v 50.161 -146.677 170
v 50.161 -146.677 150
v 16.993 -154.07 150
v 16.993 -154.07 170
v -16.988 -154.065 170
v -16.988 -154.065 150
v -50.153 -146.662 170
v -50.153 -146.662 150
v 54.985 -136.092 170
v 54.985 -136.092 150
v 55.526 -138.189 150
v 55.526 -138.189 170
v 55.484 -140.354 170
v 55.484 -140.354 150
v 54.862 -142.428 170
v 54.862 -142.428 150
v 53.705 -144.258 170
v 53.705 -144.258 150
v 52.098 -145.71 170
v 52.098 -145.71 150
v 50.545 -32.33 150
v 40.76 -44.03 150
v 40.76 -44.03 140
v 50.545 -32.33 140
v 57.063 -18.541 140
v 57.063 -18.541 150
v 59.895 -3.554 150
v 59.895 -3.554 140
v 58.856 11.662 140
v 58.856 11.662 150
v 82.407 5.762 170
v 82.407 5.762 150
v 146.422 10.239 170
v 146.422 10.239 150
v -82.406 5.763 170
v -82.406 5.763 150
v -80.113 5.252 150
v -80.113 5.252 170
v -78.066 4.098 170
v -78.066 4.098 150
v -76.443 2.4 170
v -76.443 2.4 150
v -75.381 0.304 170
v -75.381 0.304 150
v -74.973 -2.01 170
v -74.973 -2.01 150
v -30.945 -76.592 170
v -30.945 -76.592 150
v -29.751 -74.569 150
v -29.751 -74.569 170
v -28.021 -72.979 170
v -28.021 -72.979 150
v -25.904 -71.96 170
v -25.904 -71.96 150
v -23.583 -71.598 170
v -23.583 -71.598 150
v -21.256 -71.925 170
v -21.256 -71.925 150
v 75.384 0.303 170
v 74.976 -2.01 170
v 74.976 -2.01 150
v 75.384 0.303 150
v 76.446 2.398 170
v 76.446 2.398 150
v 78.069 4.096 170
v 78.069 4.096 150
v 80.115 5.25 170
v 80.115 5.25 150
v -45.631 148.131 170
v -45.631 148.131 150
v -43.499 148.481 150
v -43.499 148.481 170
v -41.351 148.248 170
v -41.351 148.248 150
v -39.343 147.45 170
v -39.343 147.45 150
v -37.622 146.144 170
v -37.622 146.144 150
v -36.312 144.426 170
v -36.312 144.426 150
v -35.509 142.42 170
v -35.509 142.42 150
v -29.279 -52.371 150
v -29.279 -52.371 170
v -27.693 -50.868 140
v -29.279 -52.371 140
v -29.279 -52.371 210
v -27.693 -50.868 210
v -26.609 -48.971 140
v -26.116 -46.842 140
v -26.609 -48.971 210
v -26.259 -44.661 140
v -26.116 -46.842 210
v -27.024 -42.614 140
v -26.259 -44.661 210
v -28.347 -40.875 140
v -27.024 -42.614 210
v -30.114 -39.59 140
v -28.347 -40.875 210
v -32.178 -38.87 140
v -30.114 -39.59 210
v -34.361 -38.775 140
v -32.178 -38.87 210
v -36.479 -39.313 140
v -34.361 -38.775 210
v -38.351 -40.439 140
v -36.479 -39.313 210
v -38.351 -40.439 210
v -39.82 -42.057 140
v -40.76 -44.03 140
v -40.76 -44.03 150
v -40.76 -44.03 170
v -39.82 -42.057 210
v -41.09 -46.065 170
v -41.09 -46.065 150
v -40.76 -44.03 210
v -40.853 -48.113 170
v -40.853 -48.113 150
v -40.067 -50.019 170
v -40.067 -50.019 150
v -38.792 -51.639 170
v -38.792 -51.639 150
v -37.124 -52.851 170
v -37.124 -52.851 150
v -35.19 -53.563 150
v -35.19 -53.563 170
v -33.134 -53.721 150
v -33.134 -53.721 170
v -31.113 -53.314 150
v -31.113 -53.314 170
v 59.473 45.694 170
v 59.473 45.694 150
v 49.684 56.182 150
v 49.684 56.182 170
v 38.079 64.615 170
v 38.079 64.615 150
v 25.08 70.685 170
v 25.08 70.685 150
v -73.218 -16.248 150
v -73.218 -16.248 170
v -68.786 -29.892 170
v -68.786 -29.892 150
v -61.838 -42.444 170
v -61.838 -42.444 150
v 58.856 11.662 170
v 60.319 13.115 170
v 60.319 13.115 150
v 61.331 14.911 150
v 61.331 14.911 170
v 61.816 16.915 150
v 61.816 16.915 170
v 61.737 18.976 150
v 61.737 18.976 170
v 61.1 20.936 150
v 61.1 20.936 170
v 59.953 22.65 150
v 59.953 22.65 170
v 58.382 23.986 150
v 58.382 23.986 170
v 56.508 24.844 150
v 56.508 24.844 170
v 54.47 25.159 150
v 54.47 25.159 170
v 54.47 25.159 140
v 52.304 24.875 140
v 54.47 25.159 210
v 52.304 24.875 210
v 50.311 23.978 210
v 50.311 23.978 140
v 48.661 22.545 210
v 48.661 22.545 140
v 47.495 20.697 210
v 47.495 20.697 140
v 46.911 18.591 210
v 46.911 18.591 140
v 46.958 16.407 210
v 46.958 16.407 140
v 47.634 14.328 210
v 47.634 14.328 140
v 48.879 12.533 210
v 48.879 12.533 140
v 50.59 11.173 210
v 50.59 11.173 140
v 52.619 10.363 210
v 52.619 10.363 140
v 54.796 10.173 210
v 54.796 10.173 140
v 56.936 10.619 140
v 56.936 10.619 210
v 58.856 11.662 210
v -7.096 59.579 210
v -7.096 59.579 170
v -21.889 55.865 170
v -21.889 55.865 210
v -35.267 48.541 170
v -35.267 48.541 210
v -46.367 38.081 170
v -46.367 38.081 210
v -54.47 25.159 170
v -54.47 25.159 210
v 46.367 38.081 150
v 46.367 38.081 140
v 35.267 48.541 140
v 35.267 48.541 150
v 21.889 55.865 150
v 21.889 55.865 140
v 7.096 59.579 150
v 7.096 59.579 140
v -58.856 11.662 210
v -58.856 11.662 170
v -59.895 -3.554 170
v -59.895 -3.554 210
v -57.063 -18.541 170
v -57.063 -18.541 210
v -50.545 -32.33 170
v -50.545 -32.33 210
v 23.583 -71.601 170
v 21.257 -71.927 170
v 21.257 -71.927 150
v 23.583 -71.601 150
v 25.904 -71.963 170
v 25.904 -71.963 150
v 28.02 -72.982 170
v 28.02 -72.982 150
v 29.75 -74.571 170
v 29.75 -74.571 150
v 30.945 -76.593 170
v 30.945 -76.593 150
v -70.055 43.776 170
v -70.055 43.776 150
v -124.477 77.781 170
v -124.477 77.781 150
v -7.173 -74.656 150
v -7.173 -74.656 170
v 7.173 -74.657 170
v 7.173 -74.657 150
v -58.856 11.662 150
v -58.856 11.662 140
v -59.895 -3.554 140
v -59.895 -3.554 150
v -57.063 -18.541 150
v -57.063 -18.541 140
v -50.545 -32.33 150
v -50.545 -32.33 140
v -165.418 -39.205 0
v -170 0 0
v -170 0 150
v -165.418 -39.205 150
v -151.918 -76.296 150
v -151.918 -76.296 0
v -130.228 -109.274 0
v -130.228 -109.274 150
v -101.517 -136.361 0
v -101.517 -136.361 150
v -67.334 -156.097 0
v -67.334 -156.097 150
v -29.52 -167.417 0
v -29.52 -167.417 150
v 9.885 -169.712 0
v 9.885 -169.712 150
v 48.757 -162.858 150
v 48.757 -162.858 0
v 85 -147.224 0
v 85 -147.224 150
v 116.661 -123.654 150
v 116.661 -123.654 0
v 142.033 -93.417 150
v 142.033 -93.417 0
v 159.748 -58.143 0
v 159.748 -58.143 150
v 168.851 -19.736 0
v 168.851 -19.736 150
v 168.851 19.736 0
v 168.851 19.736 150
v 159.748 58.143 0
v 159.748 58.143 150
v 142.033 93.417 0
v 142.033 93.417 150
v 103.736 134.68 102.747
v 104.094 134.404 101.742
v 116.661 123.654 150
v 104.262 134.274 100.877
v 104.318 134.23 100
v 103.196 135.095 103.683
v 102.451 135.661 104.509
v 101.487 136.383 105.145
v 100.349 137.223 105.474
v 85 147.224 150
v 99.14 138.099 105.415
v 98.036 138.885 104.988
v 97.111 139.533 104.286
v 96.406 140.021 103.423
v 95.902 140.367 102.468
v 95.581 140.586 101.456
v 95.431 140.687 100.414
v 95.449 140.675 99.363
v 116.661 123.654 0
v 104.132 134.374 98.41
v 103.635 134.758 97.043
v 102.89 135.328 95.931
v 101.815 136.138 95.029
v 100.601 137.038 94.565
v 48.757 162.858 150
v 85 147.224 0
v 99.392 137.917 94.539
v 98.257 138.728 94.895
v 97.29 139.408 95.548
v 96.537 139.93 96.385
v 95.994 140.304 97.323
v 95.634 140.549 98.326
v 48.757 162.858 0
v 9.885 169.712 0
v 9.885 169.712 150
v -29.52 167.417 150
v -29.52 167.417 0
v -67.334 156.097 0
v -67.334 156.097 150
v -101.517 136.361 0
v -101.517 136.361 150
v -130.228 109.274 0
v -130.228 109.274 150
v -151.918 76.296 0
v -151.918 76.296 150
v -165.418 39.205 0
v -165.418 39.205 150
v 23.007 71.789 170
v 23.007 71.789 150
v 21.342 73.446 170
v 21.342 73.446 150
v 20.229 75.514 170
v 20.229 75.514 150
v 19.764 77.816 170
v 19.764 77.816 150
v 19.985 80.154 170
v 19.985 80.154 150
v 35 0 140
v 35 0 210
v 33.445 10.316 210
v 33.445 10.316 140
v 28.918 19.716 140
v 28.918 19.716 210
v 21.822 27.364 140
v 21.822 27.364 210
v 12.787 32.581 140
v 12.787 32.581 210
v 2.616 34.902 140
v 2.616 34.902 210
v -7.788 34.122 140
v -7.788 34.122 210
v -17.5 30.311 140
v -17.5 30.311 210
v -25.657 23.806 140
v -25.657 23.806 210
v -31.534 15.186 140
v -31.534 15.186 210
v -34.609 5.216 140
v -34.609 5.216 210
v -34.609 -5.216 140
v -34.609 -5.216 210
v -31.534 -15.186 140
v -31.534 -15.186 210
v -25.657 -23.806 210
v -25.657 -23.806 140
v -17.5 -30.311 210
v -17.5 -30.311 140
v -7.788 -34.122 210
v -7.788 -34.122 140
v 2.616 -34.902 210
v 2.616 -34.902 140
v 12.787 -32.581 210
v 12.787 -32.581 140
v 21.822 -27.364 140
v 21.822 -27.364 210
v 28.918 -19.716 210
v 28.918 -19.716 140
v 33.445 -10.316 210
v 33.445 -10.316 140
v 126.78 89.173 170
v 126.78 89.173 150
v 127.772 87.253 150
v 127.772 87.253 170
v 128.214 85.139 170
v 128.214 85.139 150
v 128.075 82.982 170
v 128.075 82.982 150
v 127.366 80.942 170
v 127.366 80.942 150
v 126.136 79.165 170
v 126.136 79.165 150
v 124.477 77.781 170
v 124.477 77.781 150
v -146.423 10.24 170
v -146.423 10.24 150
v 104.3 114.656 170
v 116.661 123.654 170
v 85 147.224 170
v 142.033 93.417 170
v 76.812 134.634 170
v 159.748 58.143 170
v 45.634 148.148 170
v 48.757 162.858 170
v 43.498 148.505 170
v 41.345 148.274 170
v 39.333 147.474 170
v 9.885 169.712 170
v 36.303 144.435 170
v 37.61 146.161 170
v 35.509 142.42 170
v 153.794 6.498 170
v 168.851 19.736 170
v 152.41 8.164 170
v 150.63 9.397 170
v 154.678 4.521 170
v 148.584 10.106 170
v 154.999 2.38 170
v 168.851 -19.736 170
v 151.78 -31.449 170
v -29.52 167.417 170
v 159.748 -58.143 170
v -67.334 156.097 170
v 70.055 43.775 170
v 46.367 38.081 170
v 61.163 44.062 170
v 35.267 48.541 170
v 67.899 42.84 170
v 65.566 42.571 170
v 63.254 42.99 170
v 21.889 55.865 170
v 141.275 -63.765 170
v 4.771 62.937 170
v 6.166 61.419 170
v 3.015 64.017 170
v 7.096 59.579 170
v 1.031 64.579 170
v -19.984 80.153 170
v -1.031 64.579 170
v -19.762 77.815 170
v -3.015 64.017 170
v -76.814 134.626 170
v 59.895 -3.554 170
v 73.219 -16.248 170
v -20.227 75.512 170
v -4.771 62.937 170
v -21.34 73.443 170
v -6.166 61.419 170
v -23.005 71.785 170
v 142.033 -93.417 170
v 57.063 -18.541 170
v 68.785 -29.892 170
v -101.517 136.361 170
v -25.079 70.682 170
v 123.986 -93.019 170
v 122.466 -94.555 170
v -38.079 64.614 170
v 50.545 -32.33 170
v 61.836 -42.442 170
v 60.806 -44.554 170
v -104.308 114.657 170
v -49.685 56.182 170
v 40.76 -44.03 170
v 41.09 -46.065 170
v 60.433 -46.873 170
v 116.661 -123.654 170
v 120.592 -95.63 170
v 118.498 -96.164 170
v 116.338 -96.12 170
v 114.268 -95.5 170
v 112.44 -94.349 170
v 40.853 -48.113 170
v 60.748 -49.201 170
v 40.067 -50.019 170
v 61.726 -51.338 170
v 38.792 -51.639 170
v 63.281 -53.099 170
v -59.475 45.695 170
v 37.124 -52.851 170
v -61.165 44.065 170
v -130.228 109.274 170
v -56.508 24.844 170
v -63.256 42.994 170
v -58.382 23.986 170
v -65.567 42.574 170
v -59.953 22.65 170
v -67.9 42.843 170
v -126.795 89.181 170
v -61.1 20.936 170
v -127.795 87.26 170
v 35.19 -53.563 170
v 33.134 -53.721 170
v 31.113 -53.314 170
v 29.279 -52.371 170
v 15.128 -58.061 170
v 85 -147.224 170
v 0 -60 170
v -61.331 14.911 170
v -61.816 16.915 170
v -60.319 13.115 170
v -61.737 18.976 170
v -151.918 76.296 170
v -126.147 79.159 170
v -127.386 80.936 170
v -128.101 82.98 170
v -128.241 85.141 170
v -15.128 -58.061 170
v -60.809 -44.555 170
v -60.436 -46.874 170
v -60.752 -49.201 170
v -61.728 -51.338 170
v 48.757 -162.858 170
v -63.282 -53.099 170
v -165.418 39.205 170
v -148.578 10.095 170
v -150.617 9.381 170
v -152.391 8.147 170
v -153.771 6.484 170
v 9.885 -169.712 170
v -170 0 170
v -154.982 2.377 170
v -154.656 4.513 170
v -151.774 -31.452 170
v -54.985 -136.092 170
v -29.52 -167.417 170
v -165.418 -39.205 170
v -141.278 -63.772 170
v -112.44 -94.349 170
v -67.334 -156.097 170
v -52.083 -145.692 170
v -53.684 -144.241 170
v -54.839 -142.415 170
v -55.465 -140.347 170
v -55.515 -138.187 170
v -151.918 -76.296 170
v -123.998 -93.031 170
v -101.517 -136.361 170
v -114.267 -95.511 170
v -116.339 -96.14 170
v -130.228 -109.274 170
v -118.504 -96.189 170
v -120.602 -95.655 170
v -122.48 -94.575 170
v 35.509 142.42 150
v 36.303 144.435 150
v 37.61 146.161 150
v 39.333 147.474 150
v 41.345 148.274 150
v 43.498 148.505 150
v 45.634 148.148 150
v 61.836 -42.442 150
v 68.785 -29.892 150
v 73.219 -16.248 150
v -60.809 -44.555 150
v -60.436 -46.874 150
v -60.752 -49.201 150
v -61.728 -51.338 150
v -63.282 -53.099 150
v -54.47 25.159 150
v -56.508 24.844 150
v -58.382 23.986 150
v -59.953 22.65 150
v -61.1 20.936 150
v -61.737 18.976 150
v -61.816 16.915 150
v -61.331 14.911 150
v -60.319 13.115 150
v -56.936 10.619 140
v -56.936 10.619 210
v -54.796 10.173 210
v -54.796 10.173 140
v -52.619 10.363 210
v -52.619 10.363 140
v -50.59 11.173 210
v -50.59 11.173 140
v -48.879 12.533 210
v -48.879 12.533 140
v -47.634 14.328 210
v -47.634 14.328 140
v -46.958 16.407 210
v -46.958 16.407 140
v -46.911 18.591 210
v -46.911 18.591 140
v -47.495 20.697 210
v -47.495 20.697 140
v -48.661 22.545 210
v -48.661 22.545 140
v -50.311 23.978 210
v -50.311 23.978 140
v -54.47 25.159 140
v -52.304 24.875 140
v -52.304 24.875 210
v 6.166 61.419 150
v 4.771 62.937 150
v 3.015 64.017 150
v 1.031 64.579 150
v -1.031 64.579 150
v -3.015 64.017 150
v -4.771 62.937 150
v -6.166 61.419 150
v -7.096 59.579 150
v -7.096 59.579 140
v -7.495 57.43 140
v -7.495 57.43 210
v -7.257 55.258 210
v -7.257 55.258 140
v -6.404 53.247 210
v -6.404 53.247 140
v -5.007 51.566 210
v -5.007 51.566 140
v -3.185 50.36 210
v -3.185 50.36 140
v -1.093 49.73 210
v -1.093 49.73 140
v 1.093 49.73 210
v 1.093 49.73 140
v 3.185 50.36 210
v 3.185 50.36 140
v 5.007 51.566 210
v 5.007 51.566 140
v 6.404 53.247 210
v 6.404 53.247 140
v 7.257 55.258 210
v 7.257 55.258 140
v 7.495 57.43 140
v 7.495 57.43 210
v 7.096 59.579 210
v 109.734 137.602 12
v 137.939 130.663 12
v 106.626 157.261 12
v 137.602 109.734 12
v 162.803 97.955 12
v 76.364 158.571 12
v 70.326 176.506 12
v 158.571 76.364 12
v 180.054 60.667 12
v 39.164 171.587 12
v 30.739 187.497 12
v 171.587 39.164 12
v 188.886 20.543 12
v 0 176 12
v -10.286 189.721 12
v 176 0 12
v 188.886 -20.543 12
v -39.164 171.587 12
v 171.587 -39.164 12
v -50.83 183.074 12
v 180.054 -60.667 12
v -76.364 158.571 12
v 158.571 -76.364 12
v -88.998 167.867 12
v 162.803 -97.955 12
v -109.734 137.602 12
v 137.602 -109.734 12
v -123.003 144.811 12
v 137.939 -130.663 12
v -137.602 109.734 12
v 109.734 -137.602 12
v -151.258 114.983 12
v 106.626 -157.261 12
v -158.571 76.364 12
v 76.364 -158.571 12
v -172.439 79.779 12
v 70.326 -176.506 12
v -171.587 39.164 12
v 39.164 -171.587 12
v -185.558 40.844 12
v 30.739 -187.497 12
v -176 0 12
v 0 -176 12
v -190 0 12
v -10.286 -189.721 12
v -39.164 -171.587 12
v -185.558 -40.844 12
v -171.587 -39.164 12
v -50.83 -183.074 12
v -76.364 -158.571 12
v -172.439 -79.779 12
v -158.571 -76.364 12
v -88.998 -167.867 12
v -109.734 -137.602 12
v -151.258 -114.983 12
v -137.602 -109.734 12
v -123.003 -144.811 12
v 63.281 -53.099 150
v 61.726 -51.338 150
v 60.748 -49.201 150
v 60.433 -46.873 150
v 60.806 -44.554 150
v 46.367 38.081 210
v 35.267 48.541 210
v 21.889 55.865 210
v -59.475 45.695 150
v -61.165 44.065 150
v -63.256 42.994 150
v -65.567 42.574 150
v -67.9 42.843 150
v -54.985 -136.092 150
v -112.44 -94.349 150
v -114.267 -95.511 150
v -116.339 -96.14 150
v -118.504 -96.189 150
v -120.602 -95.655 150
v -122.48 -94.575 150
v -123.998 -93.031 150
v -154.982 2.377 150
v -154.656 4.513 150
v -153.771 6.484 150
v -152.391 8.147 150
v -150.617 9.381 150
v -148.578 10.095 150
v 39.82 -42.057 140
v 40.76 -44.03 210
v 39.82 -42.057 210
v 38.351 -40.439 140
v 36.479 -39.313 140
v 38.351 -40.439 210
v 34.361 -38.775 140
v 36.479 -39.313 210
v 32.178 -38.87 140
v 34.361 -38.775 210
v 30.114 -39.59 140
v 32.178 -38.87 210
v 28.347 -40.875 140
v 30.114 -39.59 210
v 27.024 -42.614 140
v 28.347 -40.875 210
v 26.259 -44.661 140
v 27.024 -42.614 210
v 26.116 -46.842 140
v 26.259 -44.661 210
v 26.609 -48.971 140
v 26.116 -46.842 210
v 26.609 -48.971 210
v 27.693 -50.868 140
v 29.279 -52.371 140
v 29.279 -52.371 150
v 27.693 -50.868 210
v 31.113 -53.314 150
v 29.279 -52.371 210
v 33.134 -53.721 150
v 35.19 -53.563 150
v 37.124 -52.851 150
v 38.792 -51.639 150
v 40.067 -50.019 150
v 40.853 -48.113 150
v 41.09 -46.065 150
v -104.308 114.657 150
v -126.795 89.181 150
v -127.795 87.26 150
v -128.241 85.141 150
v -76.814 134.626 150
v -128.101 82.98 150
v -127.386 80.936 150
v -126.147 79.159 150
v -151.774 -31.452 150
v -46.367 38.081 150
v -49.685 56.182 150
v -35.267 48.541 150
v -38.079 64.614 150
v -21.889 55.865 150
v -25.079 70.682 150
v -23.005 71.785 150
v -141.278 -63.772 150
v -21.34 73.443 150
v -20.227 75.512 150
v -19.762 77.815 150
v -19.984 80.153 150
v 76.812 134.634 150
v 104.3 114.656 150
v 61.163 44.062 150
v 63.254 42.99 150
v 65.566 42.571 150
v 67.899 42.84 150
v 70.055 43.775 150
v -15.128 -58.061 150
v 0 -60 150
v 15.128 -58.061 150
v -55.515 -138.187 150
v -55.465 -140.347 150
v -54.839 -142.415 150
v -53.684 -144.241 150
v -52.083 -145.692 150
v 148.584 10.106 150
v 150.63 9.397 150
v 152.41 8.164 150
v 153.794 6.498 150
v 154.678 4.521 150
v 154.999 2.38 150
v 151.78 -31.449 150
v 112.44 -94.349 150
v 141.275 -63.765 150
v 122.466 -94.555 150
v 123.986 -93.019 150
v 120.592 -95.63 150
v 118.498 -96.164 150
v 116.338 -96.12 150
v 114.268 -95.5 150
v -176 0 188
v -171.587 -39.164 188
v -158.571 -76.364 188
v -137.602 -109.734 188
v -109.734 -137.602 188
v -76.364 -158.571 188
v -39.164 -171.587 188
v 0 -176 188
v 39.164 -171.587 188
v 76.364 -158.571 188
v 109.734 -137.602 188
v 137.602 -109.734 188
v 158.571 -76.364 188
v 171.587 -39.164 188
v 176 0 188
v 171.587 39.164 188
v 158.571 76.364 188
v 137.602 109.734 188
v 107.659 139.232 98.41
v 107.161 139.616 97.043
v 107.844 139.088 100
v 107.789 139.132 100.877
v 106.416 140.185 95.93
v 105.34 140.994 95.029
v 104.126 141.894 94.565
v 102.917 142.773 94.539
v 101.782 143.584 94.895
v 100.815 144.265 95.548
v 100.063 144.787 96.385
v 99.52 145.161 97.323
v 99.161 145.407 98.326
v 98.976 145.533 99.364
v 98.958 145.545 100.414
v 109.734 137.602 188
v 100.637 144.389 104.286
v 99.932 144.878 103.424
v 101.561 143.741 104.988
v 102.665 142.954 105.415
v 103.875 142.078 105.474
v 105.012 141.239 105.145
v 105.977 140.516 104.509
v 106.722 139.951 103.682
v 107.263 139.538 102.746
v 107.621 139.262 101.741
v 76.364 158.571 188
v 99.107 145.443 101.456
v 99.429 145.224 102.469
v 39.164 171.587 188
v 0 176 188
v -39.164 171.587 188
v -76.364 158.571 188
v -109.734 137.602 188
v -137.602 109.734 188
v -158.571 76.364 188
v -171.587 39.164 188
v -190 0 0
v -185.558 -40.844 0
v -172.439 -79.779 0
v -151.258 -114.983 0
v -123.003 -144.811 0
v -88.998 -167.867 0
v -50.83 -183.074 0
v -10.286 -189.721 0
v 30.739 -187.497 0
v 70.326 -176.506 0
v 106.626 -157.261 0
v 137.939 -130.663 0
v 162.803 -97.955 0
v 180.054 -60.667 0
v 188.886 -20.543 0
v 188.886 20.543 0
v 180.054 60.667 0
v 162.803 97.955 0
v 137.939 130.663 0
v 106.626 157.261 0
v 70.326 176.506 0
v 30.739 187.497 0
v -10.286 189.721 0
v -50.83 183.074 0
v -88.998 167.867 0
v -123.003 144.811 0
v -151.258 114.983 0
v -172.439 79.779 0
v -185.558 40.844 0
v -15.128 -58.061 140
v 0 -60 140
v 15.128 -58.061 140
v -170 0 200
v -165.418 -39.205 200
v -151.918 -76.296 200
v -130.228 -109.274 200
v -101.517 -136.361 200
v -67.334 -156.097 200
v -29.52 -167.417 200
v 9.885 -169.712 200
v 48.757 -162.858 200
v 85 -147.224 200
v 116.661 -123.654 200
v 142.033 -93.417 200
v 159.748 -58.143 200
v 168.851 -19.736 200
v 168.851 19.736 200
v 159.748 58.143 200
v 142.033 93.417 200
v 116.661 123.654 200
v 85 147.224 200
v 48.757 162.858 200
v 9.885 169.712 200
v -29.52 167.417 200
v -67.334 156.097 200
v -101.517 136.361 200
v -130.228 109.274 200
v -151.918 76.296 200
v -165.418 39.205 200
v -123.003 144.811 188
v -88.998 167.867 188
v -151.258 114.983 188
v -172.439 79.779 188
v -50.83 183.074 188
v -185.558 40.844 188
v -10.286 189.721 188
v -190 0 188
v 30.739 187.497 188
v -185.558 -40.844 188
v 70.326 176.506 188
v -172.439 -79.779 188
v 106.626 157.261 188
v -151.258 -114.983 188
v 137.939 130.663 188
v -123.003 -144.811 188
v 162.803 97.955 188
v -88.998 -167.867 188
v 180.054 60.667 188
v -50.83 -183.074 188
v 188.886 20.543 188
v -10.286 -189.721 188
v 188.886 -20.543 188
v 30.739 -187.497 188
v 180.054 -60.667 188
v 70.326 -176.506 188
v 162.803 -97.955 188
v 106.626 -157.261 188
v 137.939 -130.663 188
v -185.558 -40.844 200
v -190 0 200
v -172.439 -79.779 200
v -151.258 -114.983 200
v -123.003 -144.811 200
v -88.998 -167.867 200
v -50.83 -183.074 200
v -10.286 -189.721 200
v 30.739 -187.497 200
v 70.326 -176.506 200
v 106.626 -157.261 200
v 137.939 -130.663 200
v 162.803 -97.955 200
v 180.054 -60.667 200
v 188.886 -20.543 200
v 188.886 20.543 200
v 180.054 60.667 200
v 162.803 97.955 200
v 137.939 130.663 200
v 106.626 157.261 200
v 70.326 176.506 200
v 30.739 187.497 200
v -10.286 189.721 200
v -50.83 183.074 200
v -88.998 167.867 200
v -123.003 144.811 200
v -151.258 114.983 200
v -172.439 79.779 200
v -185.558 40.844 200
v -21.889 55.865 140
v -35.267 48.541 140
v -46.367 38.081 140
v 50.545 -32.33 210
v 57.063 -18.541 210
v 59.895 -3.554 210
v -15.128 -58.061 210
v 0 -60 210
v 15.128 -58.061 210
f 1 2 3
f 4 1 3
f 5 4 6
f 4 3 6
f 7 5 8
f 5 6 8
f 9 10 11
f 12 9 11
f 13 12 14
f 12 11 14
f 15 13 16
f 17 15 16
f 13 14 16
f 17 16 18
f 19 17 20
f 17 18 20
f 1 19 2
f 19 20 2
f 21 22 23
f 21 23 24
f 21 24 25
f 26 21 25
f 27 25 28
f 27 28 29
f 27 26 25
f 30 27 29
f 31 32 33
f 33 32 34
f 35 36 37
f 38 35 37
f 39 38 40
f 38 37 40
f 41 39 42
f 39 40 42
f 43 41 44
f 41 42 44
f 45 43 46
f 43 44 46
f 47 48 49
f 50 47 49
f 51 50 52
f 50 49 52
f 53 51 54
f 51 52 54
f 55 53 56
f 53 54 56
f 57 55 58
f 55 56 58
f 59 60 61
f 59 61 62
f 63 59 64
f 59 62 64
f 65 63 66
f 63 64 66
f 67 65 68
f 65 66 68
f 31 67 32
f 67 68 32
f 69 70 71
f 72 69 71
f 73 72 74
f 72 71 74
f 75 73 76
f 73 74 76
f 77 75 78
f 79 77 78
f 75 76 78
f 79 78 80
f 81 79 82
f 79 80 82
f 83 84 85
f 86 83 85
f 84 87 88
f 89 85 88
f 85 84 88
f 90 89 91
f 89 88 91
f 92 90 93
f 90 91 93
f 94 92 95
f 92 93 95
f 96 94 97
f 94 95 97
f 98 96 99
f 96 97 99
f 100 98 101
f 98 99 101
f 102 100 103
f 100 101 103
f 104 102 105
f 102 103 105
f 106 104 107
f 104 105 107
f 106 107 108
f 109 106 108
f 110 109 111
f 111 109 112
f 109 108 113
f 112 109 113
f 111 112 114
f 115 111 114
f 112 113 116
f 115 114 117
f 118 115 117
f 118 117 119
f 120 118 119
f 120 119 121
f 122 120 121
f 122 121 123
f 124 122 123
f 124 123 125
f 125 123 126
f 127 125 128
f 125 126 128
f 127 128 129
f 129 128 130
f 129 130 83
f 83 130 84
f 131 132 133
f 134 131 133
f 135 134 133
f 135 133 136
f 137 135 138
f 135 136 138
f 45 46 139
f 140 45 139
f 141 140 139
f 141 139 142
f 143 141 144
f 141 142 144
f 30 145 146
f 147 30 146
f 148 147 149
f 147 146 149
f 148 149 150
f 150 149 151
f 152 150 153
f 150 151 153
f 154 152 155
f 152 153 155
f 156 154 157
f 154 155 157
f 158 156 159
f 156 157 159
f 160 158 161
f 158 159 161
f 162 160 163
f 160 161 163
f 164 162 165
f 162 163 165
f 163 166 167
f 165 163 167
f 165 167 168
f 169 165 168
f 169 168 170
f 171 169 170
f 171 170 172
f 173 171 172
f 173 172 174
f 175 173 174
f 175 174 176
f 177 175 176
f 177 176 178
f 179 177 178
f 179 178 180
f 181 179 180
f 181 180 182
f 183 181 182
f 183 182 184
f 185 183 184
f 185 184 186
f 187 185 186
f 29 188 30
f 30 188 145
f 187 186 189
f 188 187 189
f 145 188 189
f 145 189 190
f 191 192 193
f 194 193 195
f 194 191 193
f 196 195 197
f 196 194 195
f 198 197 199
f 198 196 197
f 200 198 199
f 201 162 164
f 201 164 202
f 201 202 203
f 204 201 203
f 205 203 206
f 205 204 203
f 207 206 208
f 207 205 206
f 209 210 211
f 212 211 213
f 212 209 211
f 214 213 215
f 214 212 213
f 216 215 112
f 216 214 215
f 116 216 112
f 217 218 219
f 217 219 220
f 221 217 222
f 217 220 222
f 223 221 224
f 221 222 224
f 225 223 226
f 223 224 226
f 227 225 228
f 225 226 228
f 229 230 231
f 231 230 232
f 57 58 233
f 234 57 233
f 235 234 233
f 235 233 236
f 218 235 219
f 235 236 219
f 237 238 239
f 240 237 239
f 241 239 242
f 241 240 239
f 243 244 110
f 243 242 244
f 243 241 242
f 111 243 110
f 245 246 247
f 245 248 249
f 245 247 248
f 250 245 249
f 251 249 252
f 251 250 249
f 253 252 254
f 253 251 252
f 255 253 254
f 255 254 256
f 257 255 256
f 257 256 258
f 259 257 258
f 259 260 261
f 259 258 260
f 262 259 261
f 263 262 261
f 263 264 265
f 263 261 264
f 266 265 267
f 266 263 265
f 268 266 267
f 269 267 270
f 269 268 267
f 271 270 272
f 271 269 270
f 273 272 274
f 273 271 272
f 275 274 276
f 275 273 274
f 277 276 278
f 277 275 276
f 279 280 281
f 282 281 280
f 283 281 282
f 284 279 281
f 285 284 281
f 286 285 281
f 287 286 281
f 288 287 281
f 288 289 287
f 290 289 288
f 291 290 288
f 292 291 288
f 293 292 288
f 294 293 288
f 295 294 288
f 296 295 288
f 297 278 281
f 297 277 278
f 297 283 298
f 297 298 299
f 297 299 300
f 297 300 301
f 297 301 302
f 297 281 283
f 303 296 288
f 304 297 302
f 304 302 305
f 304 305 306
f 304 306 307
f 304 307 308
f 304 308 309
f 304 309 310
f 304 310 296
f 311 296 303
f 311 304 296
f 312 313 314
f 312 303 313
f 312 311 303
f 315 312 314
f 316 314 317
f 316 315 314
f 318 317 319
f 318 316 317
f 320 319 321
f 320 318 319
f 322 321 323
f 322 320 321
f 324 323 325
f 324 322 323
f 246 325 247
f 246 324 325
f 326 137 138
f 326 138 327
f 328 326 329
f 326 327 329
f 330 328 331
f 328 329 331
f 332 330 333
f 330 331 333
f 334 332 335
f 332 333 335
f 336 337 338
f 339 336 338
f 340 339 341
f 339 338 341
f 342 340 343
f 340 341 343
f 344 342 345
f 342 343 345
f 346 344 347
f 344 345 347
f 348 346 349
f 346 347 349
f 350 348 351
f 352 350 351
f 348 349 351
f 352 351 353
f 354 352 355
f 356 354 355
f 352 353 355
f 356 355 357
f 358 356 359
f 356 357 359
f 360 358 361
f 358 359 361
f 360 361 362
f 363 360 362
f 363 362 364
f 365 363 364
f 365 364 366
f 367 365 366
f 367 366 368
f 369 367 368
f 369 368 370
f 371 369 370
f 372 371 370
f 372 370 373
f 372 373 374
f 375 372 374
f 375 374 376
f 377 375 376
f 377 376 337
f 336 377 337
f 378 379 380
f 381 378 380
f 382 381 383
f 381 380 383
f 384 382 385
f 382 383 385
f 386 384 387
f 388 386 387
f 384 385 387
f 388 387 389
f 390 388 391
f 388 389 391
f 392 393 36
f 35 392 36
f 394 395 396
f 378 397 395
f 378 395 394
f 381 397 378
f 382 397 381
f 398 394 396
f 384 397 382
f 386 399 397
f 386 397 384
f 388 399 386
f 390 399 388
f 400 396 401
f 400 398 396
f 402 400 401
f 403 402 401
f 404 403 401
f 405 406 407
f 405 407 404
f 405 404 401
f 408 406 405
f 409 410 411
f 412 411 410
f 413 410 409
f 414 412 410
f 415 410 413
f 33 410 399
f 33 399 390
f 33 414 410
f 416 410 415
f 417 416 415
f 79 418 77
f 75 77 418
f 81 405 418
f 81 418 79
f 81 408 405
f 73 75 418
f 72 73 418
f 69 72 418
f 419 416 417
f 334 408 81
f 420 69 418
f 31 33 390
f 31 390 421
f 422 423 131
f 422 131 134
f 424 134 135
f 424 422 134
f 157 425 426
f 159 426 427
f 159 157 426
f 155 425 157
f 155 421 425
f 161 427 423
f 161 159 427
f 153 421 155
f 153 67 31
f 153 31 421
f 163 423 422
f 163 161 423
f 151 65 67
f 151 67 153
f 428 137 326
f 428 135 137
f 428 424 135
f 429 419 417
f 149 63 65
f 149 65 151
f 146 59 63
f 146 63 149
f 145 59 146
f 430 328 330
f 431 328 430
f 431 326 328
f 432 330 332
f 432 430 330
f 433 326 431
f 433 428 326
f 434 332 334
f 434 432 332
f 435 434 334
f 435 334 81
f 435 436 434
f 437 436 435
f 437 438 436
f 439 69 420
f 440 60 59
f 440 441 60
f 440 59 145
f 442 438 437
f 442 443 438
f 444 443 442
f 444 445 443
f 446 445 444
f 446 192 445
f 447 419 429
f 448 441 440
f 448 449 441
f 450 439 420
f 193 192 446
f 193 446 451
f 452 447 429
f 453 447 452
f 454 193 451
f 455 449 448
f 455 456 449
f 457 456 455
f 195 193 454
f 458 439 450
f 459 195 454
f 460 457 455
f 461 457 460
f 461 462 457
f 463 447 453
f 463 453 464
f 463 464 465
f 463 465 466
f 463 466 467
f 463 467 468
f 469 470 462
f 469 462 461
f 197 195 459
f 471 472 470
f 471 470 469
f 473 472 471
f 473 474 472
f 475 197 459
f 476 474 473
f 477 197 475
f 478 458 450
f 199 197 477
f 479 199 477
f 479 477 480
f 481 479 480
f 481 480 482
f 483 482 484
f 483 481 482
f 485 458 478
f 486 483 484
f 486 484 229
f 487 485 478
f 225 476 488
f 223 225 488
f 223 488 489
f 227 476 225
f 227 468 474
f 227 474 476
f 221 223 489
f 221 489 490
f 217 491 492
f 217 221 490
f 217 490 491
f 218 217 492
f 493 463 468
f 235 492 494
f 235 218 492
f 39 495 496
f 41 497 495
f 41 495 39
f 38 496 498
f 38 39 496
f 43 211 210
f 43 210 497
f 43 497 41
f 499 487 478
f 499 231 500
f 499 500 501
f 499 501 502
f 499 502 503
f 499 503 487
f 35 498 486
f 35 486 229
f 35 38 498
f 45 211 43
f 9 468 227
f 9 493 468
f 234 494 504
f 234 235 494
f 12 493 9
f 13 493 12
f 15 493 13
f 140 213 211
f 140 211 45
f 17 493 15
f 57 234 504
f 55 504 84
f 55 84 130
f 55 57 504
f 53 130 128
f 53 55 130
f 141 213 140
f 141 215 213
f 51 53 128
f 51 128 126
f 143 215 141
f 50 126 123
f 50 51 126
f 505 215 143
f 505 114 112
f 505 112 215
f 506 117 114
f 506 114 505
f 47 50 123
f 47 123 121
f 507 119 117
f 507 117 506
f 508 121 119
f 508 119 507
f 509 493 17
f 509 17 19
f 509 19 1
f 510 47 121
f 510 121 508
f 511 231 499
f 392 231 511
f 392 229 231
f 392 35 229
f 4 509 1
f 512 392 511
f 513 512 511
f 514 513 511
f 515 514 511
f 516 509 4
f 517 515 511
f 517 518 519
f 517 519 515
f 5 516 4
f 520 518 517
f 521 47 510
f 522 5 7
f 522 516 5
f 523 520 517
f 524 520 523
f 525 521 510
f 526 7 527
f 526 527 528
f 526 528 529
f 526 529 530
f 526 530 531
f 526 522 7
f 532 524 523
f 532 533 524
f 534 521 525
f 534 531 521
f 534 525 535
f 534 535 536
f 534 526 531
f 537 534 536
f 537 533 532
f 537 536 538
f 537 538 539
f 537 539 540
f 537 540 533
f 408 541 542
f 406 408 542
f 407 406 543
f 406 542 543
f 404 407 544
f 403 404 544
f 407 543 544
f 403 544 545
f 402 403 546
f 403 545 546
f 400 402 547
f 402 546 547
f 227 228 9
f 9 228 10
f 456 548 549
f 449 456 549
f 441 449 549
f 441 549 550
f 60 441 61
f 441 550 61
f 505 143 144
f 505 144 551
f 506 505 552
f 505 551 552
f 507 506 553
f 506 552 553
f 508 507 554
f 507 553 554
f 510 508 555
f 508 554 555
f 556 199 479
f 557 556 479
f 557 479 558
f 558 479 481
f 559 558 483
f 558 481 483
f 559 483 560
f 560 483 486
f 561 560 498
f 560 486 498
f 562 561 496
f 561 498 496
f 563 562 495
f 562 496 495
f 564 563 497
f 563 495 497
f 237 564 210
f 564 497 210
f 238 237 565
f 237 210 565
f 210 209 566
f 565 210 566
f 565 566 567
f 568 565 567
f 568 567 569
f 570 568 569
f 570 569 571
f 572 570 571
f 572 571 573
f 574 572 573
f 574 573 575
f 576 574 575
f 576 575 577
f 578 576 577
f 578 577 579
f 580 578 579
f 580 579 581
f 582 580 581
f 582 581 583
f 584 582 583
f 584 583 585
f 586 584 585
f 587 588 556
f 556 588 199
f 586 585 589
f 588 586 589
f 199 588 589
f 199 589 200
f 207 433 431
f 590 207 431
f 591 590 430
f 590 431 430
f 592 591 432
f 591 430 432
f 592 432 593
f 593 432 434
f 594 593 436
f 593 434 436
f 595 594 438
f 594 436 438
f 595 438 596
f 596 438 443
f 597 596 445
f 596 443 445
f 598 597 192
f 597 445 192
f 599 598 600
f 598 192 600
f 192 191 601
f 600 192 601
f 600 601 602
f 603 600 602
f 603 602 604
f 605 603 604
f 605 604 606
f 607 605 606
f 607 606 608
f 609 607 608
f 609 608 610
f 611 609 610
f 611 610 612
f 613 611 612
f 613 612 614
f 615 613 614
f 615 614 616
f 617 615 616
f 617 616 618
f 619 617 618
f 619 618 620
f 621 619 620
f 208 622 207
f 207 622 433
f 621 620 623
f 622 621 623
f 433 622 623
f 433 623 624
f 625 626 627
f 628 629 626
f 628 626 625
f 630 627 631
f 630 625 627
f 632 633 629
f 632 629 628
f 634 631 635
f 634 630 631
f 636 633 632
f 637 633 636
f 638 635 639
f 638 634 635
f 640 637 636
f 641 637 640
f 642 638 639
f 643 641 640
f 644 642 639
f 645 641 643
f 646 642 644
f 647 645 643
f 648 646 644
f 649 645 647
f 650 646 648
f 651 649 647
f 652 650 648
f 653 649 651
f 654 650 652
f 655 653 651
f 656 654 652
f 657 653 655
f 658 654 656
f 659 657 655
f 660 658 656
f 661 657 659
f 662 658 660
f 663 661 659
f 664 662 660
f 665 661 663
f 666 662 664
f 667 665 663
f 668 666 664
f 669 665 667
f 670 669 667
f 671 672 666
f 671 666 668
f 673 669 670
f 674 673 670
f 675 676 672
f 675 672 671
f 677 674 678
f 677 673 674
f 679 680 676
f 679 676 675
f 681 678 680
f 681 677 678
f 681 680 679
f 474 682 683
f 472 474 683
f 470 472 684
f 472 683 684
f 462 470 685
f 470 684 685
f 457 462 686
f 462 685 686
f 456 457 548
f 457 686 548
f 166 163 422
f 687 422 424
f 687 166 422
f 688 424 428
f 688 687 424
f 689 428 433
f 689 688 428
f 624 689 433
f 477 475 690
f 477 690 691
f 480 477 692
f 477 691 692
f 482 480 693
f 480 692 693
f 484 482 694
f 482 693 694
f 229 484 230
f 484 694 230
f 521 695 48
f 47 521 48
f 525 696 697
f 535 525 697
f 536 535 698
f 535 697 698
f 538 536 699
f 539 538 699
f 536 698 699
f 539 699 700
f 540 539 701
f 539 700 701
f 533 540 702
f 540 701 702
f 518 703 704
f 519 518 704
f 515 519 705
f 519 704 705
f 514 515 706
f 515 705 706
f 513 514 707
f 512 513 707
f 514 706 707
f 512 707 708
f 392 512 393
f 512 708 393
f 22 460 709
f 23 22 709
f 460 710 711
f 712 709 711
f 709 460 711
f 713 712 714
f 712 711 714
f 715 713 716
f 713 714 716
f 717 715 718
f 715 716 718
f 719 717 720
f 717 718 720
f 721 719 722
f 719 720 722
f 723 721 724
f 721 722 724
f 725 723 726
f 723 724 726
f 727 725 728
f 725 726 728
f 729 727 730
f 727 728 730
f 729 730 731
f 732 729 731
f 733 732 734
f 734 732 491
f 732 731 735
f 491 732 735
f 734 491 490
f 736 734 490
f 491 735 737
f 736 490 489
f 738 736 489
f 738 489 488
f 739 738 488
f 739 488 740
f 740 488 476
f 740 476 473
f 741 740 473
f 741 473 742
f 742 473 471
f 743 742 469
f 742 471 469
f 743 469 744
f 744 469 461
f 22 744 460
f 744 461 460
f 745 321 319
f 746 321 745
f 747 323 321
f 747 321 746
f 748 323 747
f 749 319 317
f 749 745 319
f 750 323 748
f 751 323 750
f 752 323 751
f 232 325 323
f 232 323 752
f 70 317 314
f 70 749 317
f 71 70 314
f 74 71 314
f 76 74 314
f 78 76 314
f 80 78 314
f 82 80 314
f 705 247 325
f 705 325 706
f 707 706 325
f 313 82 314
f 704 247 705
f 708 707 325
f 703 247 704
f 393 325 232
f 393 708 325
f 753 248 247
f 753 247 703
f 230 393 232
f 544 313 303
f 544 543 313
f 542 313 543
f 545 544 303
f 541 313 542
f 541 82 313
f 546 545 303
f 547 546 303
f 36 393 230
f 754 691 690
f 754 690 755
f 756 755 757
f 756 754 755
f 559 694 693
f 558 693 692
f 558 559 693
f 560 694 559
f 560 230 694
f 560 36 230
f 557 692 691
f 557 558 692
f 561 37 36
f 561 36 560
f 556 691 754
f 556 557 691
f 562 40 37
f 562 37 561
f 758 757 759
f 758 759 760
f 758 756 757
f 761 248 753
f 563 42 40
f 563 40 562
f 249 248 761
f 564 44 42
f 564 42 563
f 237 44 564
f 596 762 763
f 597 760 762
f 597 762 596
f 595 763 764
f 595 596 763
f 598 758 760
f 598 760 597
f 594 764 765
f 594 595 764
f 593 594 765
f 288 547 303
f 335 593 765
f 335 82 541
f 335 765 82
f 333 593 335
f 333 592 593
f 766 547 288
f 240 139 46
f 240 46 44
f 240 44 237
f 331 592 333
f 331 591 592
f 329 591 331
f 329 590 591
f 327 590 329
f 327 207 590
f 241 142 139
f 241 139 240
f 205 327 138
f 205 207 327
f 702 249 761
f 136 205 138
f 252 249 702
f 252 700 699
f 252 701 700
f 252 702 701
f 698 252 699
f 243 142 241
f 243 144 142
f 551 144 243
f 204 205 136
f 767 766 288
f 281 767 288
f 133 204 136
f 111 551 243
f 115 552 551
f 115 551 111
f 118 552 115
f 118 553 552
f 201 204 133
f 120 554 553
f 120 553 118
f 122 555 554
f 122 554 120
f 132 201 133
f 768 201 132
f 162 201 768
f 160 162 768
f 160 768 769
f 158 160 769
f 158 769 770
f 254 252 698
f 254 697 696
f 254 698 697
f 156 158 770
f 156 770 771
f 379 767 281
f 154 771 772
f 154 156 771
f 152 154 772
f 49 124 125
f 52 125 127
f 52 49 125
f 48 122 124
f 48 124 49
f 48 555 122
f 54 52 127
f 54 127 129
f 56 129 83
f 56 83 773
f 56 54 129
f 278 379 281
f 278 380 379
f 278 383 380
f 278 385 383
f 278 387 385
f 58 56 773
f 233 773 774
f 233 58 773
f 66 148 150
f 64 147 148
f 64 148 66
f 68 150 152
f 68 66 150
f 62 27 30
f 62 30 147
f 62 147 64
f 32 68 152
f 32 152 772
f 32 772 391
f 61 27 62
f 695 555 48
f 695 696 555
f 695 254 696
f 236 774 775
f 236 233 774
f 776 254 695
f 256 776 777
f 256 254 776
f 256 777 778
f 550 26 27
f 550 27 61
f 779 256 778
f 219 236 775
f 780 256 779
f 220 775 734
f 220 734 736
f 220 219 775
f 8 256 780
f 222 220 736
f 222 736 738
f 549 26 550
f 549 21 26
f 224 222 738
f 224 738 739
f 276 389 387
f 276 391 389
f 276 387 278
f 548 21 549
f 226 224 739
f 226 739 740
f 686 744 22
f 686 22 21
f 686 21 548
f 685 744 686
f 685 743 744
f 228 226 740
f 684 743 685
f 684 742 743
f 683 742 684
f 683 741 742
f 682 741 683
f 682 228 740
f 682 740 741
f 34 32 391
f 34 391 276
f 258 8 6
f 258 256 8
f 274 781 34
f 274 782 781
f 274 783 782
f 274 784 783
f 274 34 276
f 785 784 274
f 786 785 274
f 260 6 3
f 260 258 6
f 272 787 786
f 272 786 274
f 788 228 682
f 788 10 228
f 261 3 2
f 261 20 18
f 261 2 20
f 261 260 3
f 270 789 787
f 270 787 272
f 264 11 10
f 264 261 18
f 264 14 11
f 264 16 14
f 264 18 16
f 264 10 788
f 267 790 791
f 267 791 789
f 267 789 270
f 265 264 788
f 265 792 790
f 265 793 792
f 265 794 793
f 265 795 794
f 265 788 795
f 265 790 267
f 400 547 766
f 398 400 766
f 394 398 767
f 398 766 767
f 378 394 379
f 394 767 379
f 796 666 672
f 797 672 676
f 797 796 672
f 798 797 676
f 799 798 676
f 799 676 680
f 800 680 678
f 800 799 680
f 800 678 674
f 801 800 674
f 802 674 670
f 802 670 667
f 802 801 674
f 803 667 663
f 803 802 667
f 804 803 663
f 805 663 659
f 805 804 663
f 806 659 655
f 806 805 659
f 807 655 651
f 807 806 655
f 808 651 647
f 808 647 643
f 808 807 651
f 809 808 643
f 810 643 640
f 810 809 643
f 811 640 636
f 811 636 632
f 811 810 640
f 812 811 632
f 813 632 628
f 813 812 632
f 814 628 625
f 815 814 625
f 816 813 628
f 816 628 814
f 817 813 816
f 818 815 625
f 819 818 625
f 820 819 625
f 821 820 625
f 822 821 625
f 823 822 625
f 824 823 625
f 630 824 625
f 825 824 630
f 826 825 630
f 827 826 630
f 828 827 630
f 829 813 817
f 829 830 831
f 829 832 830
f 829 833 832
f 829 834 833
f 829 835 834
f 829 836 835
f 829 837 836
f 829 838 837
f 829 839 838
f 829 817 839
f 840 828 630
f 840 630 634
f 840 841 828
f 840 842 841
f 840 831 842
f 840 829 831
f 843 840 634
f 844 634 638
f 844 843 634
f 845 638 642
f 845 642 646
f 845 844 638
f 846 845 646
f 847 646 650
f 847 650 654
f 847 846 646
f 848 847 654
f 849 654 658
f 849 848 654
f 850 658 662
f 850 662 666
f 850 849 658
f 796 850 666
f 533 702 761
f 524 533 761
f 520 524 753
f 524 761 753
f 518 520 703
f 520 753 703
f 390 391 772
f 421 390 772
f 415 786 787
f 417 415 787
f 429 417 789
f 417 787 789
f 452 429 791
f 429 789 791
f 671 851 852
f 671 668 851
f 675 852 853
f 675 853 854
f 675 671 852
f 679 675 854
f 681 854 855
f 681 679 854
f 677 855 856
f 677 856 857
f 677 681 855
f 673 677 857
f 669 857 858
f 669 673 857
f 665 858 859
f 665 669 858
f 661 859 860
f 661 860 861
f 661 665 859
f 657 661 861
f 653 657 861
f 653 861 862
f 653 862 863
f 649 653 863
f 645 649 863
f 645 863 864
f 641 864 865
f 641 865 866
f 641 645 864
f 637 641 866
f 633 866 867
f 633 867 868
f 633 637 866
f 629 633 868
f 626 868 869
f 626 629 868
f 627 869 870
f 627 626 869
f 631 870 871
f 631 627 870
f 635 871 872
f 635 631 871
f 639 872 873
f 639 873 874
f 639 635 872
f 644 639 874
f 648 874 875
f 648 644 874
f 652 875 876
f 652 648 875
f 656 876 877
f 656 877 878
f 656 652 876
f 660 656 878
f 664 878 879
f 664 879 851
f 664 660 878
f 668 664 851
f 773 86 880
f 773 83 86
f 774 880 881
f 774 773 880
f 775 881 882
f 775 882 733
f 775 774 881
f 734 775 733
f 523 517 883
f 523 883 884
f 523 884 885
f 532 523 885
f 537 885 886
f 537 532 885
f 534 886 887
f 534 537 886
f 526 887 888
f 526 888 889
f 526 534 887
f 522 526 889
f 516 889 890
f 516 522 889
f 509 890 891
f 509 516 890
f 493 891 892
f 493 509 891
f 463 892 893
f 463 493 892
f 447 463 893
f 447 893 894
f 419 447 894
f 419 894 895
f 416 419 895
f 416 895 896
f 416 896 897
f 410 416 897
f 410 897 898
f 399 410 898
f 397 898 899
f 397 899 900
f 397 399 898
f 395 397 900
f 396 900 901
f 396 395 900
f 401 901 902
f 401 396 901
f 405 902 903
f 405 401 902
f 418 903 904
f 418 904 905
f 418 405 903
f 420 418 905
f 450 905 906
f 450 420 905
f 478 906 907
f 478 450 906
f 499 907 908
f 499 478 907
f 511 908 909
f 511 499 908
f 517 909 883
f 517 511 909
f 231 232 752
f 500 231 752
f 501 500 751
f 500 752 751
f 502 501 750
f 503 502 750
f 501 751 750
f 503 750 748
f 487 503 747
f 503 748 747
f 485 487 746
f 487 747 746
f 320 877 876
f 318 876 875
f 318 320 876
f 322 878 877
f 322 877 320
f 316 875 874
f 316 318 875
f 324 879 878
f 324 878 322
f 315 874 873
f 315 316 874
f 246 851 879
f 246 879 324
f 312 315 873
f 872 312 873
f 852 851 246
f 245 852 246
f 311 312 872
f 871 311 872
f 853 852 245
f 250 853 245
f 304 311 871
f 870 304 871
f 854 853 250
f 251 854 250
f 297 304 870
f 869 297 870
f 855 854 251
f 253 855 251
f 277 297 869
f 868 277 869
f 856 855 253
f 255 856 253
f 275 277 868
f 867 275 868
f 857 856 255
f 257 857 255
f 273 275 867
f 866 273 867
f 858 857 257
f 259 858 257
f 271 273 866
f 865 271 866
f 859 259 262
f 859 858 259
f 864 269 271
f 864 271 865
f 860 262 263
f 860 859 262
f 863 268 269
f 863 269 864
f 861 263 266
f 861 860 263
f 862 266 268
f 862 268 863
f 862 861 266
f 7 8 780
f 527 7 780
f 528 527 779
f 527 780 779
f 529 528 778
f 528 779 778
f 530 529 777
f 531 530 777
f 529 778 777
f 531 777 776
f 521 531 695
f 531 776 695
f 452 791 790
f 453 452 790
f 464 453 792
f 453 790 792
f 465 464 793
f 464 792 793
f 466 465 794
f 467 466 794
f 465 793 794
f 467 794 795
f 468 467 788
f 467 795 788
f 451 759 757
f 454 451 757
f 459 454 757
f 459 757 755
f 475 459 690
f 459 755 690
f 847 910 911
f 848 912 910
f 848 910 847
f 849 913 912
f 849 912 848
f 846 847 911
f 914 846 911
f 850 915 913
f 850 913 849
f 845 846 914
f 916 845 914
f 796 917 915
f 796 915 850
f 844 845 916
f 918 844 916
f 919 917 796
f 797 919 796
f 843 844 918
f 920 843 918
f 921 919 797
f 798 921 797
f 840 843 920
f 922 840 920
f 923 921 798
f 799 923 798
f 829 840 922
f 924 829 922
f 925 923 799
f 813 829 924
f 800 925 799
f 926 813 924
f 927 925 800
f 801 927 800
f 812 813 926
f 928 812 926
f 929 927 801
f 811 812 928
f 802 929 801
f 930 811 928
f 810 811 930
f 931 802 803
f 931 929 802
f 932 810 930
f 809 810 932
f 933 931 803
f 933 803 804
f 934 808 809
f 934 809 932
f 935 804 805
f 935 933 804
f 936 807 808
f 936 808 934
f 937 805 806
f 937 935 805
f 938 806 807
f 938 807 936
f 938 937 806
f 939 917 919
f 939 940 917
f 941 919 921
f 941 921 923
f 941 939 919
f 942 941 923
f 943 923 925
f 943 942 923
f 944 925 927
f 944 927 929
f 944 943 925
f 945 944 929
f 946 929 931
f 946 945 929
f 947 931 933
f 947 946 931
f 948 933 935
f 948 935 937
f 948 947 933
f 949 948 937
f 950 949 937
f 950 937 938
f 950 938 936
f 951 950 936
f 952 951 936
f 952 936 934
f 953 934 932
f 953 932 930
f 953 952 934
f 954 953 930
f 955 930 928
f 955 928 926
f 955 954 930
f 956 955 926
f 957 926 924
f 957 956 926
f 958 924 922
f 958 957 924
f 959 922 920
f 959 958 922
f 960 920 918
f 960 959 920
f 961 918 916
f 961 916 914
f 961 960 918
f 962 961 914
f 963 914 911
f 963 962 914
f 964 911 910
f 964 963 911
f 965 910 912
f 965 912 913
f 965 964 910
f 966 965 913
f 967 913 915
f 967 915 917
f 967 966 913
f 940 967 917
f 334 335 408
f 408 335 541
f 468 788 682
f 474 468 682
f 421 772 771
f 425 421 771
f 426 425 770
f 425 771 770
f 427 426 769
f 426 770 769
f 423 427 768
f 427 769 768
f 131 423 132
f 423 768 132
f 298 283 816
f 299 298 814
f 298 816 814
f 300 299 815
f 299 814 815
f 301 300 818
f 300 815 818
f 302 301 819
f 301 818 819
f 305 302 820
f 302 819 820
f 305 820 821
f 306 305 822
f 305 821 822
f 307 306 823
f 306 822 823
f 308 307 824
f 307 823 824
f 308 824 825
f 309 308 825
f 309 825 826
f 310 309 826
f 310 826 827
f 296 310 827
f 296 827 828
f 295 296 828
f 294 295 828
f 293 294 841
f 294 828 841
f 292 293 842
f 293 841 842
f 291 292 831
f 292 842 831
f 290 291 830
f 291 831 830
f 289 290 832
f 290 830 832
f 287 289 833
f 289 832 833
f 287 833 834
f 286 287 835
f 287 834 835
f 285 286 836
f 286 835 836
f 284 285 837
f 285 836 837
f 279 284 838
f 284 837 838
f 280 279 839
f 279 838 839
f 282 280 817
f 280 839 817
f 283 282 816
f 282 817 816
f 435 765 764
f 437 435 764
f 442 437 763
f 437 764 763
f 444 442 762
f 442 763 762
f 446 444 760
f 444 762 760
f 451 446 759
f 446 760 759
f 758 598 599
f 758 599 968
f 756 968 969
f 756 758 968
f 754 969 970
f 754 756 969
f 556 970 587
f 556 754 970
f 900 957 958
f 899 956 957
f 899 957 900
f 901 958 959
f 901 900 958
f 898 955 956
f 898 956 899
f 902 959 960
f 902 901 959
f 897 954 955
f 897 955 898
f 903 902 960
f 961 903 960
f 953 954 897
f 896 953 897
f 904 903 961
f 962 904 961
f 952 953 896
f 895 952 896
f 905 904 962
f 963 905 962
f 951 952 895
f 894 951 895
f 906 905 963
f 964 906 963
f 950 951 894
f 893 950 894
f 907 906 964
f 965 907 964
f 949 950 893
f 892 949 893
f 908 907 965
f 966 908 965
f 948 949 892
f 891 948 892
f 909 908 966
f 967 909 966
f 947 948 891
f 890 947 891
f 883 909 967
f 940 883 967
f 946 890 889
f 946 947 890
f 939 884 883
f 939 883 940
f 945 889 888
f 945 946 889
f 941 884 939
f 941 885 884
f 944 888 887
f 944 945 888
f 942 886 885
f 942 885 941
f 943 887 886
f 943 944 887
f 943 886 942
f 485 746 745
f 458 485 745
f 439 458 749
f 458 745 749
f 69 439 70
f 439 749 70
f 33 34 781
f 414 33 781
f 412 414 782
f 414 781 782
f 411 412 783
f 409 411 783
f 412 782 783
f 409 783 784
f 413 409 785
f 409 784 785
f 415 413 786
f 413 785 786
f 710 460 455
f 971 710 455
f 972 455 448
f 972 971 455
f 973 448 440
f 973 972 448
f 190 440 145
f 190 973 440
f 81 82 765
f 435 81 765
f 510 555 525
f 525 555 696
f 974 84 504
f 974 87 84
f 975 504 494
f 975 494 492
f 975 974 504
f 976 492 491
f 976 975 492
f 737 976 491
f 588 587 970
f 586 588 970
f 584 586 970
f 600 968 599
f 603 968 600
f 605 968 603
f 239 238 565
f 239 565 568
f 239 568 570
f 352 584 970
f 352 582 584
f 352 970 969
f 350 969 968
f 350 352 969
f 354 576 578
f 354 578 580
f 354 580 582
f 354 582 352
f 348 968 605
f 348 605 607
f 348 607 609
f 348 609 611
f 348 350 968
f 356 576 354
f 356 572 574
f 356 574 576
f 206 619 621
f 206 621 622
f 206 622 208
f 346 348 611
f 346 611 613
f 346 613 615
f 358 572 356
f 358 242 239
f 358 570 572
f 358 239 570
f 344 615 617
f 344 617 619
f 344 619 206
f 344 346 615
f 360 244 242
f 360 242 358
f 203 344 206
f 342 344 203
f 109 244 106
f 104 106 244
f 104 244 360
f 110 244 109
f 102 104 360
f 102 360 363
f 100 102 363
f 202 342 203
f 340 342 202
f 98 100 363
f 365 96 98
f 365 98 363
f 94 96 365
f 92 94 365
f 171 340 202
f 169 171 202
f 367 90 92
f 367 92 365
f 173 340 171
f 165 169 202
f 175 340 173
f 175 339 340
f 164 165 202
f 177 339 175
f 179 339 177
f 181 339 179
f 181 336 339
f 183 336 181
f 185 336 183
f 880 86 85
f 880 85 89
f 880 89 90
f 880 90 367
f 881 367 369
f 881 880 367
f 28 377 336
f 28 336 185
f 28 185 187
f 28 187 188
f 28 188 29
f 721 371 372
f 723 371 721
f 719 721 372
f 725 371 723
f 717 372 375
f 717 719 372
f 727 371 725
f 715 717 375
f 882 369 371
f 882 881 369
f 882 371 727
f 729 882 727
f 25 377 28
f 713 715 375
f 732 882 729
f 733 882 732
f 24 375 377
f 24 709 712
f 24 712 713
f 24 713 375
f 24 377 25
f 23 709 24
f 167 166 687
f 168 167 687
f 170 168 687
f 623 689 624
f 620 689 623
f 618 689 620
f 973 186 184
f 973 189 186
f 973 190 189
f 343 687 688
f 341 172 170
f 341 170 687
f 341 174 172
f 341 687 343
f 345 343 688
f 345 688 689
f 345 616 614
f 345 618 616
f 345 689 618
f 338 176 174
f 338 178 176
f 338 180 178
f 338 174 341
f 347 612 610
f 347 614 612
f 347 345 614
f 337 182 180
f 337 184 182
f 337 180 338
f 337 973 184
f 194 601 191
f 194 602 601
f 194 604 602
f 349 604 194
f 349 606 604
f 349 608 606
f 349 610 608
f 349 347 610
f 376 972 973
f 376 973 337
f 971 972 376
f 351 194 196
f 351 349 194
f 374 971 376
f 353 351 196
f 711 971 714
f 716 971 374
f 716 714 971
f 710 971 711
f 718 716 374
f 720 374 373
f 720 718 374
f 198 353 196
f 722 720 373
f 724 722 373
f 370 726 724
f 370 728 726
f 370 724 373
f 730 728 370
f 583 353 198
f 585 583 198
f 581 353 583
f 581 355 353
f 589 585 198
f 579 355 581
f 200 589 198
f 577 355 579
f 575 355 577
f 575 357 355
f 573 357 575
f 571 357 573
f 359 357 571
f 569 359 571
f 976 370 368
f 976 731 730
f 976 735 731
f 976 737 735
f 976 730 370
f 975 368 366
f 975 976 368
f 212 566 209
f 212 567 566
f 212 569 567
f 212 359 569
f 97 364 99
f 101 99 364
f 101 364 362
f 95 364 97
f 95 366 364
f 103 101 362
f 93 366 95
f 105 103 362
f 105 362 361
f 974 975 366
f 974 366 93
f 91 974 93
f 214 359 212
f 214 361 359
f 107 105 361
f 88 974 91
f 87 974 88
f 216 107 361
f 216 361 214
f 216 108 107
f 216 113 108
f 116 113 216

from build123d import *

# Parameters (mm, degrees)
SKETCH_3_R               = 7.5
CUT_EXTRUDE_1_DEPTH      = 342.0278581
SKETCH_4_R               = 35
CUT_EXTRUDE_2_DEPTH      = 342.0278581
SWEEP_2_PROFILE_R        = 5.5
CUT_EXTRUDE_4_DEPTH      = 20
PATTERN_CIRCULAR_2_COUNT = 5


with BuildPart() as part:
    # 草图1 → 旋转1 (revolve)
    with BuildSketch(Plane(origin=(0, 0, 0), x_dir=(1, 0, 0), z_dir=(0, 1, 0))):
        Polygon((170, 0), (190, 0), (190, -12), (176, -12), (176, -188), (190, -188), (190, -200), (170, -200), align=None)
    revolve(axis=Axis((0, 0, 0), (0, 0, 1)))

    # 草图2 → 旋转2 (revolve)
    with BuildSketch(Plane(origin=(0, 0, 0), x_dir=(1, 0, 0), z_dir=(0, 1, 0))):
        Polygon((0, -140), (60, -140), (60, -150), (171, -150), (171, -170), (60, -170), (60, -210), (0, -210), align=None)
    revolve(axis=Axis((0, 0, 140), (0, 0, 1)))

    # 草图3 → 切除-拉伸1 (cut, through all)
    with BuildSketch(Plane.XY.offset(210)):
        with Locations((0, 57.15)):
            Circle(SKETCH_3_R)
        with Locations((-54.35288, 17.660321)):
            Circle(SKETCH_3_R)
        with Locations((-33.591927, -46.235321)):
            Circle(SKETCH_3_R)
        with Locations((33.591927, -46.235321)):
            Circle(SKETCH_3_R)
        with Locations((54.35288, 17.660321)):
            Circle(SKETCH_3_R)
    extrude(amount=-CUT_EXTRUDE_1_DEPTH, mode=Mode.SUBTRACT)

    # 草图4 → 切除-拉伸2 (cut, through all)
    with BuildSketch(Plane.XY.offset(210)):
        Circle(SKETCH_4_R)
    extrude(amount=-CUT_EXTRUDE_2_DEPTH, mode=Mode.SUBTRACT)

    # 切除-扫描2: sweep along a curve in space
    with BuildLine() as sweep_2_path:
        Line((94.046, 129.443, 100), (124.876, 171.912, 100))
    # 切除-扫描2 profile (on start of the path) → 切除-扫描2 (sweep, cut)
    with BuildSketch(Plane(origin=(94.046, 129.443, 100), x_dir=(0.8092483062128621, -0.5874667470517917, 0), z_dir=(0.5874667470517917, 0.8092483062128621, 0))):
        Circle(SWEEP_2_PROFILE_R)
    sweep(path=sweep_2_path.line, mode=Mode.SUBTRACT)

    # 草图13 → 切除-拉伸4 (cut)
    with BuildSketch(Plane.XY.offset(150)):
        with BuildLine():
            Line((19.985, 80.154), (35.509, 142.42))
            ThreePointArc((35.509, 142.42), (39.332805709, 147.47355651), (45.634, 148.148))
            ThreePointArc((45.634, 148.148), (91.104811943, 125.399590257), (126.78, 89.173))
            ThreePointArc((126.78, 89.173), (128.075469778, 82.982322033), (124.477, 77.781))
            Line((124.477, 77.781), (70.055, 43.775))
            ThreePointArc((70.055, 43.775), (64.394250952, 42.695581589), (59.473, 45.694))
            ThreePointArc((59.473, 45.694), (44.083519984, 60.676348797), (25.08, 70.685))
            ThreePointArc((25.08, 70.685), (20.709688829, 74.438697073), (19.985, 80.154))
        make_face()
    cut_extrude_4 = extrude(amount=CUT_EXTRUDE_4_DEPTH, mode=Mode.SUBTRACT)

    # 阵列(圆周)2: 切除-拉伸4 ×5 about axis
    pattern_circular_2_axis = Axis((0, 0, 220.5), (0, 0, -1))
    for i in range(1, PATTERN_CIRCULAR_2_COUNT):
        add(cut_extrude_4.rotate(pattern_circular_2_axis, i * 360 / PATTERN_CIRCULAR_2_COUNT), mode=Mode.SUBTRACT)


solid = part.part
